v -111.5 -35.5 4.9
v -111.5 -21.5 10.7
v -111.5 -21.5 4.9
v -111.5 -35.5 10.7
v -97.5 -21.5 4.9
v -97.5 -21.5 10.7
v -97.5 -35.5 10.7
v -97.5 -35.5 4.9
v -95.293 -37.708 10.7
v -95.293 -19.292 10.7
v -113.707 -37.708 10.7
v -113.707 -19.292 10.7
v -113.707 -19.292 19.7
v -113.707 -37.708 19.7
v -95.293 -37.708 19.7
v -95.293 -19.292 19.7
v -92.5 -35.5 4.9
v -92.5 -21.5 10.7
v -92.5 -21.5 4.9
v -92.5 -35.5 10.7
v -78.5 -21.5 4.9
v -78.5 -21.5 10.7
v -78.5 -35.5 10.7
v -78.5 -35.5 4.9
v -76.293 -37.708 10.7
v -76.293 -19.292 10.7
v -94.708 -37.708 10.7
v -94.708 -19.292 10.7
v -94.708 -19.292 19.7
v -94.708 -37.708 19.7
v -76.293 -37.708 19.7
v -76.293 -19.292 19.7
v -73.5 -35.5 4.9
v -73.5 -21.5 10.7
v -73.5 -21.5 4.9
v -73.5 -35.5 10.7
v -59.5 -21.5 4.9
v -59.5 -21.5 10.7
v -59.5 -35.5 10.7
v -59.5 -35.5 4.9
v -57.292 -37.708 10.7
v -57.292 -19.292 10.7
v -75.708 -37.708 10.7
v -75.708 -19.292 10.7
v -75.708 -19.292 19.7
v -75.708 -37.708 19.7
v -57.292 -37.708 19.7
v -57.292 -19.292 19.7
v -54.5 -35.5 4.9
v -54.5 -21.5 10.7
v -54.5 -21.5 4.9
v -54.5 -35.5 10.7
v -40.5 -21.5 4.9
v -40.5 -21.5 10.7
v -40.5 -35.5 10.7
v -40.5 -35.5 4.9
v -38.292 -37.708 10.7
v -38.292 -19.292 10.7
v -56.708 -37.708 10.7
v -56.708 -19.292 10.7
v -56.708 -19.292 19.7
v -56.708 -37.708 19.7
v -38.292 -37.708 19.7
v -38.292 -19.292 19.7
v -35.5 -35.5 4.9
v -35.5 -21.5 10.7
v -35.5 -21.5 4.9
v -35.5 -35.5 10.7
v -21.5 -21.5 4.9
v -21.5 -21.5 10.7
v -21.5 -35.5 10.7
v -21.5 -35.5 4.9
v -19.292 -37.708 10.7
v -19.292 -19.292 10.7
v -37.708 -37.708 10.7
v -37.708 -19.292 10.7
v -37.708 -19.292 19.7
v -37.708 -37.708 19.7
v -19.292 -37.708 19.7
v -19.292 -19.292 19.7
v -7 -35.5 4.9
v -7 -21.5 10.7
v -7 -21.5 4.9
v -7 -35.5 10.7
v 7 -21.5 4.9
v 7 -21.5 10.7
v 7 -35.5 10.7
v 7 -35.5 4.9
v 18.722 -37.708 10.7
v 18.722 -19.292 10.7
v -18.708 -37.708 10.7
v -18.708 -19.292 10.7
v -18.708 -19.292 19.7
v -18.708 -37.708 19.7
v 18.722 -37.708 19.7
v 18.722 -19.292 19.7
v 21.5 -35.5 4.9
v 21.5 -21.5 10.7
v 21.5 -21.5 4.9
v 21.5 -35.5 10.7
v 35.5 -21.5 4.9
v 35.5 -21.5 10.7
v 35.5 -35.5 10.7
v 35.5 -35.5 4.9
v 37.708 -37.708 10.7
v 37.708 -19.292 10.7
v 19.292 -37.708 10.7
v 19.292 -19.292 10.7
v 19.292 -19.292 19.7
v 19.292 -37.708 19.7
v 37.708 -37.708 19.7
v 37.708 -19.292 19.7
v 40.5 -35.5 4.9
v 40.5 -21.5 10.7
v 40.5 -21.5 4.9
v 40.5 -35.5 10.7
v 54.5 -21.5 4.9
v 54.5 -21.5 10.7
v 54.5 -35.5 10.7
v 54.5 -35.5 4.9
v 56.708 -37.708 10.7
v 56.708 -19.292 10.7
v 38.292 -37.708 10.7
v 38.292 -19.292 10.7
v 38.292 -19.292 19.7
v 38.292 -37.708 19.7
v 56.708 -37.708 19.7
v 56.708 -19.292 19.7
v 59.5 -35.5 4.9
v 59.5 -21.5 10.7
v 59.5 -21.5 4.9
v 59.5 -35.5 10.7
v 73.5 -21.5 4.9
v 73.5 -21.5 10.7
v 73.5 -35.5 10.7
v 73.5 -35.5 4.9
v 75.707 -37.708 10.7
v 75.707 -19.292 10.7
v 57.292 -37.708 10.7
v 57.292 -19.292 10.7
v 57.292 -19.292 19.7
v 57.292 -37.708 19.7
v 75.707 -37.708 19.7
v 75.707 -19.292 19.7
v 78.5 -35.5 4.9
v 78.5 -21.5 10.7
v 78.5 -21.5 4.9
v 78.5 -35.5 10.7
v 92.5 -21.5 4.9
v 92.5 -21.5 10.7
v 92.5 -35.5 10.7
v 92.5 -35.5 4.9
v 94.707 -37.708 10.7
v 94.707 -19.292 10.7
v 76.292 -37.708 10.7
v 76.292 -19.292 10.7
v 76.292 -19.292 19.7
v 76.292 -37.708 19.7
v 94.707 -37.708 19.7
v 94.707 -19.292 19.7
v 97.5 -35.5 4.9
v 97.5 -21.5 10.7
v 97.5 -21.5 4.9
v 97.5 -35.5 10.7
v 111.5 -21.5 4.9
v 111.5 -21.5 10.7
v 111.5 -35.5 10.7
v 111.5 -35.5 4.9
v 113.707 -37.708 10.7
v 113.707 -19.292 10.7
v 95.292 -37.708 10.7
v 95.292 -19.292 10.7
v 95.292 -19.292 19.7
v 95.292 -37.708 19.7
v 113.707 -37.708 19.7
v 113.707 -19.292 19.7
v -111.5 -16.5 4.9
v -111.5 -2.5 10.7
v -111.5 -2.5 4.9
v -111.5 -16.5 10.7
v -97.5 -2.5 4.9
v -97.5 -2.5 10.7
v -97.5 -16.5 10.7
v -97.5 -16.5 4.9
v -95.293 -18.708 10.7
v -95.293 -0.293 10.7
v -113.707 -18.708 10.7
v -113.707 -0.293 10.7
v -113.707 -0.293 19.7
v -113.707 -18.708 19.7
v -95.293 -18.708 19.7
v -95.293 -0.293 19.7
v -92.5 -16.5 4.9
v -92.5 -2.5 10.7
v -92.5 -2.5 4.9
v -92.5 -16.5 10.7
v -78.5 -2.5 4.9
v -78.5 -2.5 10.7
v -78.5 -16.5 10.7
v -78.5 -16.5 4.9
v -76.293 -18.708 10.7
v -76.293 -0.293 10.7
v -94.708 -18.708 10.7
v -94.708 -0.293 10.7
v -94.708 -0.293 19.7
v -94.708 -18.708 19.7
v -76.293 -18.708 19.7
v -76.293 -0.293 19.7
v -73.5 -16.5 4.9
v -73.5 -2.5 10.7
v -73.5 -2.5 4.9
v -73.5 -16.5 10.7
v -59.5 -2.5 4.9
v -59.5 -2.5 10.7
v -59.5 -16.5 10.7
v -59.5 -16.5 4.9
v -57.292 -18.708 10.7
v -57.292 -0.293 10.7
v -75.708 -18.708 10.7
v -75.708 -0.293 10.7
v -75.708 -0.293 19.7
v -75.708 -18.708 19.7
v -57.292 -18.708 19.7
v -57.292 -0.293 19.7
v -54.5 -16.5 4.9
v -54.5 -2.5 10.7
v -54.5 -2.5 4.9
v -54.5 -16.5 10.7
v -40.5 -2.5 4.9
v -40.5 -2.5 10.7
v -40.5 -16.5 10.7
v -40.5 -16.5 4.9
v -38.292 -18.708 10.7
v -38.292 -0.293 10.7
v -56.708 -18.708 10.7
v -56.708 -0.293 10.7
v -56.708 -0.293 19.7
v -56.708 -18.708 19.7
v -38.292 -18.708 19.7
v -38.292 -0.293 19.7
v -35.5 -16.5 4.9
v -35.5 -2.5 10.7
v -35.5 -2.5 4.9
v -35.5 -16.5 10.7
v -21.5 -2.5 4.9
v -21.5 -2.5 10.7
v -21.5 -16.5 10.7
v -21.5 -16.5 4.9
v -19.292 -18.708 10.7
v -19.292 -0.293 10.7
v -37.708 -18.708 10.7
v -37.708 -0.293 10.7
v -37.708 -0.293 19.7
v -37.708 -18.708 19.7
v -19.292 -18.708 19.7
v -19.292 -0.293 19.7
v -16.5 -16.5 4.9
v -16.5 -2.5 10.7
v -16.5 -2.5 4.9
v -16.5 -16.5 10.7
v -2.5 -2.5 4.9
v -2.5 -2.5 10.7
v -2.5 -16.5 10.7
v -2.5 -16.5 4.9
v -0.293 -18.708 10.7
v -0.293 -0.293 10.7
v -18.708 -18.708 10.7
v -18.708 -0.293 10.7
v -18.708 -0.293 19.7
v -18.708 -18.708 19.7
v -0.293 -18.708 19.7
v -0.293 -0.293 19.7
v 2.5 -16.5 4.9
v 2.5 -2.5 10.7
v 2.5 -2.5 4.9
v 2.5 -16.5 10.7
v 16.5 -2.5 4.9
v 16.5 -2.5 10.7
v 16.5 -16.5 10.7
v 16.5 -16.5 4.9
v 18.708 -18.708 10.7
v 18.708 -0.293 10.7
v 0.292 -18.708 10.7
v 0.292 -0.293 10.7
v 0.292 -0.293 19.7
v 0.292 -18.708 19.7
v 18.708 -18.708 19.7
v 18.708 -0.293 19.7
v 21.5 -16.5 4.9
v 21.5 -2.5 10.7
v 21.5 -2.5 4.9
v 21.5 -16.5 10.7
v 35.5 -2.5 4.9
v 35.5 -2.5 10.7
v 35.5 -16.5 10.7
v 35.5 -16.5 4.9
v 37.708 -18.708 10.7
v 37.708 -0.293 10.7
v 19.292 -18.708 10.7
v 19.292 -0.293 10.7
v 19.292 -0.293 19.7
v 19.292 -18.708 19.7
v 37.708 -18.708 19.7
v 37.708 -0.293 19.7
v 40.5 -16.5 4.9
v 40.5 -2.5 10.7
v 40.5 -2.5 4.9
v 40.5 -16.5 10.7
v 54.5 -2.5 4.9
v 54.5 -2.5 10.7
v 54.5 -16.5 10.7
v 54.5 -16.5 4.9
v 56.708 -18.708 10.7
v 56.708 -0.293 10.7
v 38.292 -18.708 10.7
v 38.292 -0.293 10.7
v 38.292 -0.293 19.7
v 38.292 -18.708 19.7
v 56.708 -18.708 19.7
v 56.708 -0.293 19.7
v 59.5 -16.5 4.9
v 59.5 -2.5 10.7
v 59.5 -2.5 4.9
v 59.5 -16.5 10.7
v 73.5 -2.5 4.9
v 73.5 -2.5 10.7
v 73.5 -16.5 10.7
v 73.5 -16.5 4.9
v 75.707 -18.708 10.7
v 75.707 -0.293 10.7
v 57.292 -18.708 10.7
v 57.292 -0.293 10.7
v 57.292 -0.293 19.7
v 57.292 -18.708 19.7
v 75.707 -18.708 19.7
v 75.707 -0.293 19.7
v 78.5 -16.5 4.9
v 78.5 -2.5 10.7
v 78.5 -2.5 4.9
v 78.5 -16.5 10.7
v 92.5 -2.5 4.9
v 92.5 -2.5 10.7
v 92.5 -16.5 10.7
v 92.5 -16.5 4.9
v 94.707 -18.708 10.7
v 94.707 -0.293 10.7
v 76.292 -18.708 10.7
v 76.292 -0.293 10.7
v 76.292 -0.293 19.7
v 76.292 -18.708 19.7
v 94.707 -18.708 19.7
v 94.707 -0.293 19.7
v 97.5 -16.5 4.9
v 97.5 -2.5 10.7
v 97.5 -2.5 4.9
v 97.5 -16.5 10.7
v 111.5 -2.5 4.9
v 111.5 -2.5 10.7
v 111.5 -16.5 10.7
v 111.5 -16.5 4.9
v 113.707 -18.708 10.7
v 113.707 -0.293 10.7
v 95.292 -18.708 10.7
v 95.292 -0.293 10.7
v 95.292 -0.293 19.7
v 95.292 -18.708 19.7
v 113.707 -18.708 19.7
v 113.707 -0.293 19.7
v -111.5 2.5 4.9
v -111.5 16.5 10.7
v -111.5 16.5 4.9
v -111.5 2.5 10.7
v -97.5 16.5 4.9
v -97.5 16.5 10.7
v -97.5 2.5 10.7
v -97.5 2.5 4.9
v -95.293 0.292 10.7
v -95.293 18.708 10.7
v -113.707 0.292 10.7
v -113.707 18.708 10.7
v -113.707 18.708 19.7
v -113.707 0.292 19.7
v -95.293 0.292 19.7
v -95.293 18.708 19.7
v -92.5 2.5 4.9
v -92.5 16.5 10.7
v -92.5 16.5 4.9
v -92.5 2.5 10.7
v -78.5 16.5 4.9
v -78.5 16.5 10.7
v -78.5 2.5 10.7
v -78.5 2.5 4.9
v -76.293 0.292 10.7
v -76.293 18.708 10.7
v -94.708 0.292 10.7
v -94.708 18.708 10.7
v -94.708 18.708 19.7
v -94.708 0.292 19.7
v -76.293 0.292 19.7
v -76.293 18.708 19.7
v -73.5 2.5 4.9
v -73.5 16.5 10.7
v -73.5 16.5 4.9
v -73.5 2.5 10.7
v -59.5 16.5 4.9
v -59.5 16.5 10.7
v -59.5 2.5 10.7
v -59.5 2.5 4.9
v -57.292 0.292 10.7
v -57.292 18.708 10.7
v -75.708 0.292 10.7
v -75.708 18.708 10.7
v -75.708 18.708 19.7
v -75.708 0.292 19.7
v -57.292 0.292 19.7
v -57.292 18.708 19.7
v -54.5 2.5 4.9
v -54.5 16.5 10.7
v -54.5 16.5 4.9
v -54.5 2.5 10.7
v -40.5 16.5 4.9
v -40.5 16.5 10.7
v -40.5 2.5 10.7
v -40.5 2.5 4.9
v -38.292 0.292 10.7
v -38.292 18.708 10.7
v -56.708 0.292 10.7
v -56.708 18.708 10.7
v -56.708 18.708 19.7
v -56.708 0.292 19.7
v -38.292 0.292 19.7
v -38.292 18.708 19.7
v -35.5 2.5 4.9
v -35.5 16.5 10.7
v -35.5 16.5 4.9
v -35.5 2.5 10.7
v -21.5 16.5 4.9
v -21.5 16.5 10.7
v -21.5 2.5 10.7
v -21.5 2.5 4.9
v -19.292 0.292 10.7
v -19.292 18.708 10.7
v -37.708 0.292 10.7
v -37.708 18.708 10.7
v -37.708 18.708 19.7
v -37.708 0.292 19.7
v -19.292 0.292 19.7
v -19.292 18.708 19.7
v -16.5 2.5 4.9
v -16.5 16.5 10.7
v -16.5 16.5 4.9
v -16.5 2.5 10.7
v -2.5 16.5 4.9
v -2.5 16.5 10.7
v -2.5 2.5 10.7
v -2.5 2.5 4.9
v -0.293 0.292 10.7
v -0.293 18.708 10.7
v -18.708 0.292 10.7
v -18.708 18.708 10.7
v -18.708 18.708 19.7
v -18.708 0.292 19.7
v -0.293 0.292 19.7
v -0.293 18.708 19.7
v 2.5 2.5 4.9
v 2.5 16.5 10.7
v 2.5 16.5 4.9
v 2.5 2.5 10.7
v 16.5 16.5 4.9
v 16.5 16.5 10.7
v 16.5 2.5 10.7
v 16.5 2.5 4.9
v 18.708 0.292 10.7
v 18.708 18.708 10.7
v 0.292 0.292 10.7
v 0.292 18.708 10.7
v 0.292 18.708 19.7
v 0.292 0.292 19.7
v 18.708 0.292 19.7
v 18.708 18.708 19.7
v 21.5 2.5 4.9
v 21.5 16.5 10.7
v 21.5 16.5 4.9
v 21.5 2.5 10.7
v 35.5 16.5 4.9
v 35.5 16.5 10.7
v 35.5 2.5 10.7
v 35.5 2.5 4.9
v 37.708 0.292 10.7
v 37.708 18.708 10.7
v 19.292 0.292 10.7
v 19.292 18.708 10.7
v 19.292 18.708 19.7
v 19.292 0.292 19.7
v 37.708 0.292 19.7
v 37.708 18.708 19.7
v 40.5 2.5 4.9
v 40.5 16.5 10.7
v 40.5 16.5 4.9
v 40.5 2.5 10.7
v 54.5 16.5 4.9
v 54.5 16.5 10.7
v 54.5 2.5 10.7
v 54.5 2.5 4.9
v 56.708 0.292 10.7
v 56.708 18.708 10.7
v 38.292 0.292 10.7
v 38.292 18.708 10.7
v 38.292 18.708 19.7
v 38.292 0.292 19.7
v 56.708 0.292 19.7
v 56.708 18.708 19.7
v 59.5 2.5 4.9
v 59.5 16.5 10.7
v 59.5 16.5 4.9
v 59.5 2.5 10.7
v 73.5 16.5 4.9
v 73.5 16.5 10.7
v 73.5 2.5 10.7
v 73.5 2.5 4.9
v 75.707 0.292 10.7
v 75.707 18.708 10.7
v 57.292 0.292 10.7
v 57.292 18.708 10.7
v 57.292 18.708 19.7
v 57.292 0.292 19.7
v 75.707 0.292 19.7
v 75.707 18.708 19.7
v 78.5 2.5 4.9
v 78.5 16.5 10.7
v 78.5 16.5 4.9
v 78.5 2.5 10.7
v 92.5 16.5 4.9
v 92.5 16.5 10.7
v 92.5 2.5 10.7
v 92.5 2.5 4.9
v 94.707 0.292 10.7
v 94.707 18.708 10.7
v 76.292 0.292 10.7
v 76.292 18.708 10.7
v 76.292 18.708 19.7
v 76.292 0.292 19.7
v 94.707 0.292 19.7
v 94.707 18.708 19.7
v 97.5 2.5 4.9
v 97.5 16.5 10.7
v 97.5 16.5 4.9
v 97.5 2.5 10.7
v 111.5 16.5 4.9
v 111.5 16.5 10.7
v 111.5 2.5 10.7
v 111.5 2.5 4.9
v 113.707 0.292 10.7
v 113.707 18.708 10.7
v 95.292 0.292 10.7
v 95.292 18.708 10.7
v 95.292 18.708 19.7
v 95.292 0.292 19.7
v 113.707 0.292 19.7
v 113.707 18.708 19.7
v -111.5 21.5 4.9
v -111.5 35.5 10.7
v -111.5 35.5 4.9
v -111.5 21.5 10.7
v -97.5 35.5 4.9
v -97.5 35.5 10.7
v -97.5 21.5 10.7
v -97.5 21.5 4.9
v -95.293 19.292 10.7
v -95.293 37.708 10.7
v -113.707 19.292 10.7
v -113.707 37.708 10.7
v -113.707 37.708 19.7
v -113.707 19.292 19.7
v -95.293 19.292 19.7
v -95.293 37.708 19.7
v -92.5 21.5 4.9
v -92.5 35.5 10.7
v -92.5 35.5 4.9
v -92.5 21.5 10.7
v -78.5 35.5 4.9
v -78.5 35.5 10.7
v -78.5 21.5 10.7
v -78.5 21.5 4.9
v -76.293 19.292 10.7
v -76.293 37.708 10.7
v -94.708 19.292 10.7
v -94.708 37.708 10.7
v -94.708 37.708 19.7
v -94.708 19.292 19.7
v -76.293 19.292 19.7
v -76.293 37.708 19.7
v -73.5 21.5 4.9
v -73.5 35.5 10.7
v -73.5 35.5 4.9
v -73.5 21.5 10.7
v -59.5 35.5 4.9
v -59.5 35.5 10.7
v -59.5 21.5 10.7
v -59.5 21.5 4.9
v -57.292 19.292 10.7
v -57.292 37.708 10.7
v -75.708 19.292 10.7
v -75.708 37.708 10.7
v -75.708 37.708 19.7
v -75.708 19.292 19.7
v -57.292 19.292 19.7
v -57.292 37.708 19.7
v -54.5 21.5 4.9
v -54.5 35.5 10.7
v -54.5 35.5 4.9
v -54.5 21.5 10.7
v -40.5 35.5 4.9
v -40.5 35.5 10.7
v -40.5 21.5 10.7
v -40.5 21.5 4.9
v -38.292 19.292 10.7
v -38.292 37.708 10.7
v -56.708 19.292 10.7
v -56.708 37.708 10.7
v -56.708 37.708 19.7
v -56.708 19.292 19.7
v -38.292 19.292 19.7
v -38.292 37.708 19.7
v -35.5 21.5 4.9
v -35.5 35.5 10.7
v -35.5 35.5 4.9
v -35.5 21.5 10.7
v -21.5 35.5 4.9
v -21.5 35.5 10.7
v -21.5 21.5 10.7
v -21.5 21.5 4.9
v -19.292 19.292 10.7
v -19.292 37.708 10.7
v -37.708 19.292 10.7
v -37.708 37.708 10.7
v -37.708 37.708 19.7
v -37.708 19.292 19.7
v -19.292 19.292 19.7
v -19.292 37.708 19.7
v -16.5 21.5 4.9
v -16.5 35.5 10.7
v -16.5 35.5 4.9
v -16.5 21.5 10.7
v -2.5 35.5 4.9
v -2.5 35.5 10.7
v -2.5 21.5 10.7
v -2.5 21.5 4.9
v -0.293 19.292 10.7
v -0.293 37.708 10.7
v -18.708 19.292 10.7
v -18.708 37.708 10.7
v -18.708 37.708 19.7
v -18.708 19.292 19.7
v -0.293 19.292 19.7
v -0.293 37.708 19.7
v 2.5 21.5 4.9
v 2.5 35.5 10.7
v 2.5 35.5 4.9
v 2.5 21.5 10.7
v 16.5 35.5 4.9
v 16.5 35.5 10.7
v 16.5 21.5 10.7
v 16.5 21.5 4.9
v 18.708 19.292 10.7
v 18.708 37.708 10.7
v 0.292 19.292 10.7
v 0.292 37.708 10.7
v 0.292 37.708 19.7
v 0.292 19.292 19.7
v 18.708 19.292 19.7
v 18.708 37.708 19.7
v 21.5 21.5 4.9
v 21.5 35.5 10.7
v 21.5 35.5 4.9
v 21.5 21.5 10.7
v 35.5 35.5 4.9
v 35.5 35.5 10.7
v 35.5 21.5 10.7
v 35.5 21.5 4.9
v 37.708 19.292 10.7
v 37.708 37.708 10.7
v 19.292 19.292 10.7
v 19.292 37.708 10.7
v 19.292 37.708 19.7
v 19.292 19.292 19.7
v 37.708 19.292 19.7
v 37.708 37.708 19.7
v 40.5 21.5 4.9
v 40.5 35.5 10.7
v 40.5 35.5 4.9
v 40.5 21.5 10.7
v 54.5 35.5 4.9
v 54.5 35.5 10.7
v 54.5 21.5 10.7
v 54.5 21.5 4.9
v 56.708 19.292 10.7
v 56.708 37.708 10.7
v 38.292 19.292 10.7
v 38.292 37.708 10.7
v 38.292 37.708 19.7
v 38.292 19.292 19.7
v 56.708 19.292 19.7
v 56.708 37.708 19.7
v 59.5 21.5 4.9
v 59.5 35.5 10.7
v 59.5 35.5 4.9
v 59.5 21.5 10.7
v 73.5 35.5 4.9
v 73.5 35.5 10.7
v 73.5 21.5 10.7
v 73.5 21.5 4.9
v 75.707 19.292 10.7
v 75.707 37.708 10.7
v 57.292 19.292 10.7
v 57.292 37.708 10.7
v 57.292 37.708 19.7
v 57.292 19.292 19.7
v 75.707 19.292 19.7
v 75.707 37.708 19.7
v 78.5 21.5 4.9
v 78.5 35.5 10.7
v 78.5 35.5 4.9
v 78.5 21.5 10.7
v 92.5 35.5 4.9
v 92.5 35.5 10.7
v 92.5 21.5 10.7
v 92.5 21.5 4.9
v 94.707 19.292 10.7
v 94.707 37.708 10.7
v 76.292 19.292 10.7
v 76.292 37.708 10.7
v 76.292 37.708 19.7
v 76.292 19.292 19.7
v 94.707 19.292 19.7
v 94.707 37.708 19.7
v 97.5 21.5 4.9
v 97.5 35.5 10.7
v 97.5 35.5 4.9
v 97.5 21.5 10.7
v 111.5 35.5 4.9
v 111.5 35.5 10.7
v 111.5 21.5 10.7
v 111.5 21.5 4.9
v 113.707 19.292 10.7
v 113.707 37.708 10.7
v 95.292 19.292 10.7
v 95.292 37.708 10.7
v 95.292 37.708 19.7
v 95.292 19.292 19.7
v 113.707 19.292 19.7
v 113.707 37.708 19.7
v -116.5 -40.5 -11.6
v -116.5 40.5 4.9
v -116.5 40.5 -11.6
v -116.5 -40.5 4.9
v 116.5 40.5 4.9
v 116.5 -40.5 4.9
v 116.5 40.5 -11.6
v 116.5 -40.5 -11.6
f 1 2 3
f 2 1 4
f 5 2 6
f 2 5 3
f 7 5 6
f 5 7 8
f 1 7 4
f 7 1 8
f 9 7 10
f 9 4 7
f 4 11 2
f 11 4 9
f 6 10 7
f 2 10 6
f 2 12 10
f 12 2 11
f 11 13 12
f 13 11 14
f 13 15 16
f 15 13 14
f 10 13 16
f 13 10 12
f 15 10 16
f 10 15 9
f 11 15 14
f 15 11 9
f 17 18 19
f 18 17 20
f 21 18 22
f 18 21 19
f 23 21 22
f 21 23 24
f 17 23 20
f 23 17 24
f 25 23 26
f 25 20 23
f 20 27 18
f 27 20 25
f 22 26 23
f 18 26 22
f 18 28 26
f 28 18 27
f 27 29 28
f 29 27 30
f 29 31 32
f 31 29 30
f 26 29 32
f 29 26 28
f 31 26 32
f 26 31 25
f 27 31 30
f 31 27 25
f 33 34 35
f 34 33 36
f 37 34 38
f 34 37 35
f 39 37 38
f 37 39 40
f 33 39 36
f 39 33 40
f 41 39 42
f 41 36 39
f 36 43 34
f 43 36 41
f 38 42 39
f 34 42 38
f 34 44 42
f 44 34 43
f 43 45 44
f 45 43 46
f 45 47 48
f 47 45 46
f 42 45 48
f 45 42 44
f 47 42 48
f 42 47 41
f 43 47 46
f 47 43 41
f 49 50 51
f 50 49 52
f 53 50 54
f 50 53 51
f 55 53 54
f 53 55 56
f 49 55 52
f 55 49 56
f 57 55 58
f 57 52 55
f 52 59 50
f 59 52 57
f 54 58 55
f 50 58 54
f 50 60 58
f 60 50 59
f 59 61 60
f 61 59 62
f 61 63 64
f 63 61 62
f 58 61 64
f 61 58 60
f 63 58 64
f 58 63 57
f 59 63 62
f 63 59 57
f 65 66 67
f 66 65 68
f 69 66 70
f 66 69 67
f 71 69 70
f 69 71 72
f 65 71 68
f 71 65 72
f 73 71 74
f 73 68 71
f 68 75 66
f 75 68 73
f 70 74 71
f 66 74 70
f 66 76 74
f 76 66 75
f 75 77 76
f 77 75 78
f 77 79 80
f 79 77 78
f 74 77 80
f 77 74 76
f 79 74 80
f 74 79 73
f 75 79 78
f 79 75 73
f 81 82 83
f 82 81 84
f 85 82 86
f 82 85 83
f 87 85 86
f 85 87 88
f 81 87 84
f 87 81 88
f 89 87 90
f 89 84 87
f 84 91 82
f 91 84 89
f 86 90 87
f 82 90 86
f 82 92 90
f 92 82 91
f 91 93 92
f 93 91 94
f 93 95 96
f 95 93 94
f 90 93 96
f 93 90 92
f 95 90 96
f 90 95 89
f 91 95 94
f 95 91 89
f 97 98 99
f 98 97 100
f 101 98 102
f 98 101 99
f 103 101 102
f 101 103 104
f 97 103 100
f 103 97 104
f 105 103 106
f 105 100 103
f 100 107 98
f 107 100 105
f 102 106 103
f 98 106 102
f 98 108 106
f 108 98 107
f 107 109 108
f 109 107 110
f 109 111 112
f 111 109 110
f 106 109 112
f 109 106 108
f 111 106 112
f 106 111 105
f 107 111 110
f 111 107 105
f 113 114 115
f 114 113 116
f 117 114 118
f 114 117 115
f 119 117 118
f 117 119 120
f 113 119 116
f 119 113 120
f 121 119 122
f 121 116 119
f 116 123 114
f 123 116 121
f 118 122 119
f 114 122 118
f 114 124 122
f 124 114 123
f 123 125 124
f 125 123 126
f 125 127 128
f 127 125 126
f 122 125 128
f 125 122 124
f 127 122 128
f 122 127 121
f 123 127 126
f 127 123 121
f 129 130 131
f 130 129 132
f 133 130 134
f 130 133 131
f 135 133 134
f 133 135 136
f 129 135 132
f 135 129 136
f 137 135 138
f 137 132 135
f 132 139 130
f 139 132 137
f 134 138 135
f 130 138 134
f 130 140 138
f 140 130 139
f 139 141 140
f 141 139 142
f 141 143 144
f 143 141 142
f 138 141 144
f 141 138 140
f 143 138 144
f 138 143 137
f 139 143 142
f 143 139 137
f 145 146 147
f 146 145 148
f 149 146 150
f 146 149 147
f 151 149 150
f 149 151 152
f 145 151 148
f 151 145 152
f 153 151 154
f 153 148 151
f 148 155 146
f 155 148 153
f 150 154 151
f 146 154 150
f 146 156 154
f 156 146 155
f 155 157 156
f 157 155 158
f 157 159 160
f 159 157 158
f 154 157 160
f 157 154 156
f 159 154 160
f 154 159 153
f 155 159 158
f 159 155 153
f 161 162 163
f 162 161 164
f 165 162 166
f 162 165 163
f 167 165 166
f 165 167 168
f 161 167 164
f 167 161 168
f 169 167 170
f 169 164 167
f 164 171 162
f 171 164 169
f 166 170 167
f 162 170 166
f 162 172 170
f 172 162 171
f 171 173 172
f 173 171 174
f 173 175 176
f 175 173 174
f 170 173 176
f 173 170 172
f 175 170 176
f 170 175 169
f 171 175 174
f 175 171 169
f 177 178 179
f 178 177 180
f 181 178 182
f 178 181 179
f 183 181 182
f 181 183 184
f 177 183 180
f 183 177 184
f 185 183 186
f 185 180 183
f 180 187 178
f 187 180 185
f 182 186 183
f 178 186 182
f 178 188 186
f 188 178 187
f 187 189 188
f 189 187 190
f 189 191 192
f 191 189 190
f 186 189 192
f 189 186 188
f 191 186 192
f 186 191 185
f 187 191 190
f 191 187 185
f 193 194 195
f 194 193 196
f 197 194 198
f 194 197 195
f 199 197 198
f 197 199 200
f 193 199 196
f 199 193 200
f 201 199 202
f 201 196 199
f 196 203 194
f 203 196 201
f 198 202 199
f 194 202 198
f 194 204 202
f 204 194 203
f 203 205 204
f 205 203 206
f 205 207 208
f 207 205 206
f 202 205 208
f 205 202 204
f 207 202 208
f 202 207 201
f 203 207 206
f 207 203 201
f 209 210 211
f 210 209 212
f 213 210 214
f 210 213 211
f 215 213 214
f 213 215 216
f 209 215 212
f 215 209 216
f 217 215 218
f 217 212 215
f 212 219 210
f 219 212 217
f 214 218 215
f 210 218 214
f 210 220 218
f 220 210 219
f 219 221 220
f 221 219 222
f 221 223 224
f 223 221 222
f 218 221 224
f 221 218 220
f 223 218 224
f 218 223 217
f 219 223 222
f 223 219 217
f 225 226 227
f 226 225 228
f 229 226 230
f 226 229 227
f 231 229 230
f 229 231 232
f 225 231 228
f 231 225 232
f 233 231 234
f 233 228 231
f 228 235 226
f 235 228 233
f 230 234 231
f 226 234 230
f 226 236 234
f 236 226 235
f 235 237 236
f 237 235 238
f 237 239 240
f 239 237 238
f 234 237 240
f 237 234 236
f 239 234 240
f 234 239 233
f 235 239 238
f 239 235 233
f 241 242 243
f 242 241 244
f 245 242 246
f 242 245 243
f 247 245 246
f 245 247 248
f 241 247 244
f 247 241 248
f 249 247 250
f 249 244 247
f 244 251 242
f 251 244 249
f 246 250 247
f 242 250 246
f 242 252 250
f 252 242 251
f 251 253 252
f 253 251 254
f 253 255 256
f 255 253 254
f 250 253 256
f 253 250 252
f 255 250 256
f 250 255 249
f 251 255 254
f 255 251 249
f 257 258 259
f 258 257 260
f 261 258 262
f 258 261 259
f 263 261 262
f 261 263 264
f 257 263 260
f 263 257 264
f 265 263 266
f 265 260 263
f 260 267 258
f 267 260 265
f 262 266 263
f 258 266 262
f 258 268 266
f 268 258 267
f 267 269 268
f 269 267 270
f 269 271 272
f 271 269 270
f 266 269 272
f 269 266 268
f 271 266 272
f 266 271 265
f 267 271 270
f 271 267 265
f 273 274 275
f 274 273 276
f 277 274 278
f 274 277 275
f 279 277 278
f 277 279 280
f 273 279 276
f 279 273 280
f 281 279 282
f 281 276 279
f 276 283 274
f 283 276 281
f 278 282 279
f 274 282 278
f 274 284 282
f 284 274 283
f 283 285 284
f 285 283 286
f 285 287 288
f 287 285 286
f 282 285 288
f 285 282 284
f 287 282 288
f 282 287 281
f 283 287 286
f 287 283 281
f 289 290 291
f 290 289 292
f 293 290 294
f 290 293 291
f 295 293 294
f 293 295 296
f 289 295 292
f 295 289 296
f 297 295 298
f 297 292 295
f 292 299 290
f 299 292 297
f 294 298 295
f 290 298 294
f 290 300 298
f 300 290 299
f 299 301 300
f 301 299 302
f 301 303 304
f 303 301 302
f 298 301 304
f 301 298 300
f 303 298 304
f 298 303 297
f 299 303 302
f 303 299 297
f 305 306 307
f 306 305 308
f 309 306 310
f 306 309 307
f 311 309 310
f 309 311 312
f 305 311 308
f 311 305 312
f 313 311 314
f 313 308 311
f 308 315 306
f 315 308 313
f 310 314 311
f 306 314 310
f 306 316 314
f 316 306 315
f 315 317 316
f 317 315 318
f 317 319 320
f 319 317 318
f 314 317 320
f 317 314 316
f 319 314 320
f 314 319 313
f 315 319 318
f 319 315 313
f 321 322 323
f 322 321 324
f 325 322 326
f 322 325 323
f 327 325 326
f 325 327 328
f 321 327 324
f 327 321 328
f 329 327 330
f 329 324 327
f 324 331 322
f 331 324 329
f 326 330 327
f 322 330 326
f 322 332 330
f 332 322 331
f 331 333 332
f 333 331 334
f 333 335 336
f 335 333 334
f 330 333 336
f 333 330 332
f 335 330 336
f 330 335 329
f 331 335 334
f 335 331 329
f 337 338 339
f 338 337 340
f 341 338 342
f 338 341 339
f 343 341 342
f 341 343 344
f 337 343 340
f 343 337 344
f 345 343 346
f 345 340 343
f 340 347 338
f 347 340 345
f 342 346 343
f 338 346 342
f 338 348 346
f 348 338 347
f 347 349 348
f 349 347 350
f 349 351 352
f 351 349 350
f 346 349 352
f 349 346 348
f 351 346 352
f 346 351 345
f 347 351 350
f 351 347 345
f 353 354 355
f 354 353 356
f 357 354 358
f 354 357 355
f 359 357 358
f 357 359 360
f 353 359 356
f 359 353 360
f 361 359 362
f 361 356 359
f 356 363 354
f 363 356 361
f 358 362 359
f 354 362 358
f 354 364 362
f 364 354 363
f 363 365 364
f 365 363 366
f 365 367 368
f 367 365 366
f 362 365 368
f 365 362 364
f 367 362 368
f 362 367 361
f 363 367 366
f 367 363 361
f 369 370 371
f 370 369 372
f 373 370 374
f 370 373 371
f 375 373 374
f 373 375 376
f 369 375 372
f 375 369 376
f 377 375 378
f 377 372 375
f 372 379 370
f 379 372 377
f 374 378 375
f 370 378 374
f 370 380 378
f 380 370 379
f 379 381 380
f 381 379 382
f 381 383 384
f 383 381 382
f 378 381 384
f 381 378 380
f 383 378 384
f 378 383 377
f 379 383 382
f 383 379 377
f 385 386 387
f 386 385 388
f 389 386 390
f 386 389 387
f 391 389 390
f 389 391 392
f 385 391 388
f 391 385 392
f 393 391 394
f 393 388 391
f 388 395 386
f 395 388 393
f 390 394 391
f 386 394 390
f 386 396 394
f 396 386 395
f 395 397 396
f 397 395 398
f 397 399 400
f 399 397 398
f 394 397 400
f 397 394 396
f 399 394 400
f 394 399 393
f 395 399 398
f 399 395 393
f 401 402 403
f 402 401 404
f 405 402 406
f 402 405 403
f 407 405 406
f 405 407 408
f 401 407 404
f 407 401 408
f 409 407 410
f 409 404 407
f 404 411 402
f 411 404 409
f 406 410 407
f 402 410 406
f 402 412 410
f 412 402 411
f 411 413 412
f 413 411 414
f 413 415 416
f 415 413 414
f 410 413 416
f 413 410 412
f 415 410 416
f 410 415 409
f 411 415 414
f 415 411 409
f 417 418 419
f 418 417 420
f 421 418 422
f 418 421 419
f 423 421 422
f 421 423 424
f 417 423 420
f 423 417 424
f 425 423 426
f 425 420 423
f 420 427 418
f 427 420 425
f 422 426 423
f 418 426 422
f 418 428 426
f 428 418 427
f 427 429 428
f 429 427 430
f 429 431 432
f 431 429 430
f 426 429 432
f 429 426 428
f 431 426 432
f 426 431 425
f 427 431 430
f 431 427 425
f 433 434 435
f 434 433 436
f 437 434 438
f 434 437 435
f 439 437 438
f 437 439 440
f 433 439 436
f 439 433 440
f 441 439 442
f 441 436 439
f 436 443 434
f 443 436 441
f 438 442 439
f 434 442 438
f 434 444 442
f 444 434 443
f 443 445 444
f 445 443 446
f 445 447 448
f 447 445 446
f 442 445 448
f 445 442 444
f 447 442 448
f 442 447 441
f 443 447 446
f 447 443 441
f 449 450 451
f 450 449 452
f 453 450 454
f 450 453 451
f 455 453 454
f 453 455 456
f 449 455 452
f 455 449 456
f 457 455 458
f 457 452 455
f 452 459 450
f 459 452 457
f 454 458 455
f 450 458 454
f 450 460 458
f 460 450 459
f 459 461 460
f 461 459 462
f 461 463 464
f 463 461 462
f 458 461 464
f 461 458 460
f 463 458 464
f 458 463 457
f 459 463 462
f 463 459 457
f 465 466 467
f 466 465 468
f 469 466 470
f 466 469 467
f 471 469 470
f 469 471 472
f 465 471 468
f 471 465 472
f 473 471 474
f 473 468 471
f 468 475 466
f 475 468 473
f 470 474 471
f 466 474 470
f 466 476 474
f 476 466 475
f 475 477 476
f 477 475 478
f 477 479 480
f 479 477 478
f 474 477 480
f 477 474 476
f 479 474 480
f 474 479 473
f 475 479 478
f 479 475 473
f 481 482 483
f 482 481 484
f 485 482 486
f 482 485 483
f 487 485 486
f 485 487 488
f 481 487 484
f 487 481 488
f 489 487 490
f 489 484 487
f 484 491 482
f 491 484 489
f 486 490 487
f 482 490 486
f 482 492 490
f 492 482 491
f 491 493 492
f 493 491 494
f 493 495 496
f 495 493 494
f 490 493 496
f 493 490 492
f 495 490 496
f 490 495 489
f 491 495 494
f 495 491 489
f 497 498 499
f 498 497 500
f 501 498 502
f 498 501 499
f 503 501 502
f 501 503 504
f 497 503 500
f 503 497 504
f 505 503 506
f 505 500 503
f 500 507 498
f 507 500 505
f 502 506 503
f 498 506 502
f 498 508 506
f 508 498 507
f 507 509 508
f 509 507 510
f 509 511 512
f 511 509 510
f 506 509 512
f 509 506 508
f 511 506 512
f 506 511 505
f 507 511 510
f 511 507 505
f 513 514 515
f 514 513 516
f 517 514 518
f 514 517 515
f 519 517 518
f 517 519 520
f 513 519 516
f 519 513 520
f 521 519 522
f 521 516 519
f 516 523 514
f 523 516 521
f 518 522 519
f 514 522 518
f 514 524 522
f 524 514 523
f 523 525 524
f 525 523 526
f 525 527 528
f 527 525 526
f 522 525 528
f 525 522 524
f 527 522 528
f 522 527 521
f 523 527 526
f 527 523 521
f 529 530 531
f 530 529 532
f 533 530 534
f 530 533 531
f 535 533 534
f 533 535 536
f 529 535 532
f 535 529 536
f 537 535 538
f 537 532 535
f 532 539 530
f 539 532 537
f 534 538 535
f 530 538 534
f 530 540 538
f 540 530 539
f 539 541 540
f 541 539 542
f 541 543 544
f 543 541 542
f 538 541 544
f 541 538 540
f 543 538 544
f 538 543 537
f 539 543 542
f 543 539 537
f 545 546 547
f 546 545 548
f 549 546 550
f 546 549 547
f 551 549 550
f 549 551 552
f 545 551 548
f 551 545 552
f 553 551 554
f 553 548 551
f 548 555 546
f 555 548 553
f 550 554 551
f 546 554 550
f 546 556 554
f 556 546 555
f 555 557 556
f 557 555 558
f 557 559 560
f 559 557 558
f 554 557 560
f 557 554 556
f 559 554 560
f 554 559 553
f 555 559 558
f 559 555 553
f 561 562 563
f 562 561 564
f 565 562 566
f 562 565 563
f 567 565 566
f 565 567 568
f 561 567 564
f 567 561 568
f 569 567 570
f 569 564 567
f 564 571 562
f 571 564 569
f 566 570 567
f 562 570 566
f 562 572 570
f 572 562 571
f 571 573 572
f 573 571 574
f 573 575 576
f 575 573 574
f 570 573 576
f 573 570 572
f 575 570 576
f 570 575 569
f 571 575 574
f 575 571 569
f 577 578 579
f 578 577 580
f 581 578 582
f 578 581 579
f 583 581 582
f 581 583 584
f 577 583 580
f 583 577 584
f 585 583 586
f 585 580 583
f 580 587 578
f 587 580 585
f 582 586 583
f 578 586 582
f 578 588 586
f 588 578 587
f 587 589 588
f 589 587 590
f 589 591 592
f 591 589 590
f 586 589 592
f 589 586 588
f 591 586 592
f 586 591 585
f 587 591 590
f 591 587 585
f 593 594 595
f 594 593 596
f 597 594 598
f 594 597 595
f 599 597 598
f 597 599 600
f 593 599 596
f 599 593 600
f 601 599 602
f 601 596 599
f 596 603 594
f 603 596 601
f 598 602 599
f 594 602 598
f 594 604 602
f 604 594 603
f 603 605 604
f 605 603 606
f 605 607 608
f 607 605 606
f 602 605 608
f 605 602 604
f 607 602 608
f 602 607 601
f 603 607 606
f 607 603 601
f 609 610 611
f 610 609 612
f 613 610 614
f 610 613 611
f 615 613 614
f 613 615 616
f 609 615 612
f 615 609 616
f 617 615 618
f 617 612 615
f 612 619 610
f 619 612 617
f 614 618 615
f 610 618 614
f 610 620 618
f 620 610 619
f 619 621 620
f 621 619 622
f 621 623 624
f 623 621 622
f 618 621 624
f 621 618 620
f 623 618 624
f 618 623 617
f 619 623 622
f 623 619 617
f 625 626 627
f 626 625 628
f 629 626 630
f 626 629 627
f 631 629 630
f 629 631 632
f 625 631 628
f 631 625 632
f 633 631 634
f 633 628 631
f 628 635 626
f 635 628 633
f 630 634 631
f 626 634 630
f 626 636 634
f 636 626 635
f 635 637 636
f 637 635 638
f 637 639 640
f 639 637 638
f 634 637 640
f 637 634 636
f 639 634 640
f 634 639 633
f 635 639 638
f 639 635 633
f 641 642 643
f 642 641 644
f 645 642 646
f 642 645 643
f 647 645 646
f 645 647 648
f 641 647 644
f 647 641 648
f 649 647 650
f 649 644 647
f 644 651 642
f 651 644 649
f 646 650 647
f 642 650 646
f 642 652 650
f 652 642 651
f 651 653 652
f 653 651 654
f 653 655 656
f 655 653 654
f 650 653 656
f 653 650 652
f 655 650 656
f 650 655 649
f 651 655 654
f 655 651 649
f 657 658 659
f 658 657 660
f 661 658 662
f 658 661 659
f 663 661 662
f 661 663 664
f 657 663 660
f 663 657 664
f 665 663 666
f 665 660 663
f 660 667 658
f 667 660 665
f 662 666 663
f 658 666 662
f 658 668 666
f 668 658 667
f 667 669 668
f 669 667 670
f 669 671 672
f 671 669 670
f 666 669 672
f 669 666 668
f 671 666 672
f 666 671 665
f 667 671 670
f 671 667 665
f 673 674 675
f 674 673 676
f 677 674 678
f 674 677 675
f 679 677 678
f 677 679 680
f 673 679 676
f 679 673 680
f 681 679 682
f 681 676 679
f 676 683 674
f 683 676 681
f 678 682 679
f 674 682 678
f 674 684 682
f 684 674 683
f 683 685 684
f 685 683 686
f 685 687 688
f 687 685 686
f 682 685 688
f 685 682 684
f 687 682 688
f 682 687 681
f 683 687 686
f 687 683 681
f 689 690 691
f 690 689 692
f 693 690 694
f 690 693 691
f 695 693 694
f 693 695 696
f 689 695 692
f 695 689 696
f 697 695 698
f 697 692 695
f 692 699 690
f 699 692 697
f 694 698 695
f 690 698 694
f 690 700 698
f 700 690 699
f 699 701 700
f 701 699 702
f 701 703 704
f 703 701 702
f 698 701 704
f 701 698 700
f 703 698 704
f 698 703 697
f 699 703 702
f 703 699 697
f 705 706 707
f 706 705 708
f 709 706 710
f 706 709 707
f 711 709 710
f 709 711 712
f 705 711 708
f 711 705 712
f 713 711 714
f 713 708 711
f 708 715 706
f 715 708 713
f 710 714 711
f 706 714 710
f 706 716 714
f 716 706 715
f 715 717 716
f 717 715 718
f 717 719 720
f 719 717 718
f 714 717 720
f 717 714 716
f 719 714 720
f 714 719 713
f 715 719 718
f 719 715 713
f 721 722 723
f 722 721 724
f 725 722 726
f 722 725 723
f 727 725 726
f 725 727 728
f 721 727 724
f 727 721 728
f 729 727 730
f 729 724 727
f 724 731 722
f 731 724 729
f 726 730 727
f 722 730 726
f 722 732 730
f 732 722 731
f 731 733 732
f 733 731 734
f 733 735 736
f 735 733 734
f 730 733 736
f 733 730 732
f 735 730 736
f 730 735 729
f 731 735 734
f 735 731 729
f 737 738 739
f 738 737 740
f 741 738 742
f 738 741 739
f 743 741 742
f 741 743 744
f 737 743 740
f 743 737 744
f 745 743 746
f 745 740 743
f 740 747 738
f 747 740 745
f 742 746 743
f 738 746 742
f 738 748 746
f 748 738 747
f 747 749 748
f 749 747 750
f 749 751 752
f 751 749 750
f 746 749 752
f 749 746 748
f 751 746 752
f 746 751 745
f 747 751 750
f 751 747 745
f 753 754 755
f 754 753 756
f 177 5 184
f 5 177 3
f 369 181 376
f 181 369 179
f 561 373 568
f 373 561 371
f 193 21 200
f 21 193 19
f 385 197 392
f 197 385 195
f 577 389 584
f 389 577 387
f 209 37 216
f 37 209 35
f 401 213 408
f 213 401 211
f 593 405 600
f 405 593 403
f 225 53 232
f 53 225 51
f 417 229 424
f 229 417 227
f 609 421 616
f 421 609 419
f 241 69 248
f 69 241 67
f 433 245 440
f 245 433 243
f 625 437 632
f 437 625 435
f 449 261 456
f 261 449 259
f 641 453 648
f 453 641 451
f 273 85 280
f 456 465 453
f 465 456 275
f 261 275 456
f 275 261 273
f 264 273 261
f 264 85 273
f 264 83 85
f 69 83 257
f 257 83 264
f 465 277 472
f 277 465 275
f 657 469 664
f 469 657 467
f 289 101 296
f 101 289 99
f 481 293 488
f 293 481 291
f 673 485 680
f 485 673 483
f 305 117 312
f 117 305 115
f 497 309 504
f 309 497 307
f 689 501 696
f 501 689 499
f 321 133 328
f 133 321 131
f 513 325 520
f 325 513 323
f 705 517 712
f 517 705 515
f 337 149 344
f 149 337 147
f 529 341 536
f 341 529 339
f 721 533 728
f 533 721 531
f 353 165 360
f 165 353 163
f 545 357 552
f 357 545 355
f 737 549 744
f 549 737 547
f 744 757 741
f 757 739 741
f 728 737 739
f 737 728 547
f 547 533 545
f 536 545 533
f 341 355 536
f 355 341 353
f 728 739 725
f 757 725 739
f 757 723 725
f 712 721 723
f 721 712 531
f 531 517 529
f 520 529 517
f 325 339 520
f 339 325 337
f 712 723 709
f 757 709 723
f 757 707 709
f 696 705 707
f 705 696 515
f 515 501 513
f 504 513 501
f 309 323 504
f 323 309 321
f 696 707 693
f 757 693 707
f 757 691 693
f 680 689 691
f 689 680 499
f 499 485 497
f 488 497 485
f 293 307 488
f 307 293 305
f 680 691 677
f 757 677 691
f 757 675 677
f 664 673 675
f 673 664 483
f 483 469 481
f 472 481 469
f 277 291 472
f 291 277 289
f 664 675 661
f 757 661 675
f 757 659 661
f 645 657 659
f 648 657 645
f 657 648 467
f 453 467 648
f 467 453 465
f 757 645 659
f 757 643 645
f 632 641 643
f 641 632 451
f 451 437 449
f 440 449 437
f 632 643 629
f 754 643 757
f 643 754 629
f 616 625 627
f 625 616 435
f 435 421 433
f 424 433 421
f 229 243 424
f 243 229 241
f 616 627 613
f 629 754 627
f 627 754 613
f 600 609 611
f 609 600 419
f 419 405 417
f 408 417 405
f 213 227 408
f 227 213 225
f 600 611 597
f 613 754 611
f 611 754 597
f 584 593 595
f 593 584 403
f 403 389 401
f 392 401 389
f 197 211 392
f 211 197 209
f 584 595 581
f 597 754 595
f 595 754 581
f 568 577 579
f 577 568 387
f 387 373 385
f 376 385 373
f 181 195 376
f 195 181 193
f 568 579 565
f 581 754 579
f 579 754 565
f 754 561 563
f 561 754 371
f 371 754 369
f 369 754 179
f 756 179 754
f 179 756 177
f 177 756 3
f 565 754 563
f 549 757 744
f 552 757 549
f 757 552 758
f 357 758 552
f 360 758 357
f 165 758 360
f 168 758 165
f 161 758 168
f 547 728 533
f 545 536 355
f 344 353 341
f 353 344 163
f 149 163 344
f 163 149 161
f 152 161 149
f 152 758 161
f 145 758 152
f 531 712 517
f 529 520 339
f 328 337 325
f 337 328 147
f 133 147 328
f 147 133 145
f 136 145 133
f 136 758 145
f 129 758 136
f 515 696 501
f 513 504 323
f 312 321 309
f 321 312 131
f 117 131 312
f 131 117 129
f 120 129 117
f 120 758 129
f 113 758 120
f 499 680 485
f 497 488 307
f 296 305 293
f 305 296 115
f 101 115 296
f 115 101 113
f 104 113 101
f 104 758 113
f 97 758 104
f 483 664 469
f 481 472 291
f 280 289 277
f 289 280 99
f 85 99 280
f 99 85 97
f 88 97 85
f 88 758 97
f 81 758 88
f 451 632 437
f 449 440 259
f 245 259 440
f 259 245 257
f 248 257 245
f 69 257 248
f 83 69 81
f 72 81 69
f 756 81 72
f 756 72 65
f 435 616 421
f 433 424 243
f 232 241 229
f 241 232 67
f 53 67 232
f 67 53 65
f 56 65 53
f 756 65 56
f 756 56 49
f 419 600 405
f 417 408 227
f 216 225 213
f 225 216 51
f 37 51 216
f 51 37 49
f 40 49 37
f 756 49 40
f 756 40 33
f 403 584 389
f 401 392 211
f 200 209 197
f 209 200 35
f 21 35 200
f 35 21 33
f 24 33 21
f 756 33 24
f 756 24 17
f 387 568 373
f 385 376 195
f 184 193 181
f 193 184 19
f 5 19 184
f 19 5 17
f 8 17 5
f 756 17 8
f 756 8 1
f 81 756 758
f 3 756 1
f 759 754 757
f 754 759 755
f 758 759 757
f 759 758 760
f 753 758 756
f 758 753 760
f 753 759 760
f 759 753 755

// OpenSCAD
translate([-(6*19)+(5/2), -(2*19)+(5/2)])
for(i = [0:3]) {
  for(j = [0:11]) {
	  if (i == 0 && j == 5) {
	    linear_extrude(11.6)
        translate([19*(j + .5),19*i]) square([14,14]);
	    translate([-4.415/2,-4.415/2,-1.8+5+7.5])
	    #linear_extrude(9)
	    translate([19*j,19*i]) square([18.415*2 + .6,18.415]);
      } else if (i == 0 && j == 6) {
      } else {
	    // keyswitch
	    linear_extrude(11.6)
        translate([19*j,19*i]) square([14,14]);
	    // keycap
	    translate([-4.415/2,-4.415/2,-1.8+5+7.5])
	    #linear_extrude(9)
	    translate([19*j,19*i]) square([18.415,18.415]);
      }
  }
}

// PCB
translate([-223/2,-71/2,-1.6])
linear_extrude(1.6)
square([223,71]);

// Top plate
translate([-233/2,-81/2,-1.6+5])
linear_extrude(1.5)
square([233,81]);

// Bottom plate, 16.5mm total height estimate
translate([-233/2,-81/2,-1.6+5-15])
linear_extrude(1.5)
square([233,81]);

// Teensy
translate([122.1 + (-233/2), -(81/2) + 17.12 + 17.76, -1.6 - 1.6 - 1.6])
linear_extrude(1.6)
square([30.84, 17.76]);

// Wood, w/e
translate([-233/2,-81/2,-1.6+5-15 + 1.5])
#linear_extrude(13.5)
square([233,81]);
